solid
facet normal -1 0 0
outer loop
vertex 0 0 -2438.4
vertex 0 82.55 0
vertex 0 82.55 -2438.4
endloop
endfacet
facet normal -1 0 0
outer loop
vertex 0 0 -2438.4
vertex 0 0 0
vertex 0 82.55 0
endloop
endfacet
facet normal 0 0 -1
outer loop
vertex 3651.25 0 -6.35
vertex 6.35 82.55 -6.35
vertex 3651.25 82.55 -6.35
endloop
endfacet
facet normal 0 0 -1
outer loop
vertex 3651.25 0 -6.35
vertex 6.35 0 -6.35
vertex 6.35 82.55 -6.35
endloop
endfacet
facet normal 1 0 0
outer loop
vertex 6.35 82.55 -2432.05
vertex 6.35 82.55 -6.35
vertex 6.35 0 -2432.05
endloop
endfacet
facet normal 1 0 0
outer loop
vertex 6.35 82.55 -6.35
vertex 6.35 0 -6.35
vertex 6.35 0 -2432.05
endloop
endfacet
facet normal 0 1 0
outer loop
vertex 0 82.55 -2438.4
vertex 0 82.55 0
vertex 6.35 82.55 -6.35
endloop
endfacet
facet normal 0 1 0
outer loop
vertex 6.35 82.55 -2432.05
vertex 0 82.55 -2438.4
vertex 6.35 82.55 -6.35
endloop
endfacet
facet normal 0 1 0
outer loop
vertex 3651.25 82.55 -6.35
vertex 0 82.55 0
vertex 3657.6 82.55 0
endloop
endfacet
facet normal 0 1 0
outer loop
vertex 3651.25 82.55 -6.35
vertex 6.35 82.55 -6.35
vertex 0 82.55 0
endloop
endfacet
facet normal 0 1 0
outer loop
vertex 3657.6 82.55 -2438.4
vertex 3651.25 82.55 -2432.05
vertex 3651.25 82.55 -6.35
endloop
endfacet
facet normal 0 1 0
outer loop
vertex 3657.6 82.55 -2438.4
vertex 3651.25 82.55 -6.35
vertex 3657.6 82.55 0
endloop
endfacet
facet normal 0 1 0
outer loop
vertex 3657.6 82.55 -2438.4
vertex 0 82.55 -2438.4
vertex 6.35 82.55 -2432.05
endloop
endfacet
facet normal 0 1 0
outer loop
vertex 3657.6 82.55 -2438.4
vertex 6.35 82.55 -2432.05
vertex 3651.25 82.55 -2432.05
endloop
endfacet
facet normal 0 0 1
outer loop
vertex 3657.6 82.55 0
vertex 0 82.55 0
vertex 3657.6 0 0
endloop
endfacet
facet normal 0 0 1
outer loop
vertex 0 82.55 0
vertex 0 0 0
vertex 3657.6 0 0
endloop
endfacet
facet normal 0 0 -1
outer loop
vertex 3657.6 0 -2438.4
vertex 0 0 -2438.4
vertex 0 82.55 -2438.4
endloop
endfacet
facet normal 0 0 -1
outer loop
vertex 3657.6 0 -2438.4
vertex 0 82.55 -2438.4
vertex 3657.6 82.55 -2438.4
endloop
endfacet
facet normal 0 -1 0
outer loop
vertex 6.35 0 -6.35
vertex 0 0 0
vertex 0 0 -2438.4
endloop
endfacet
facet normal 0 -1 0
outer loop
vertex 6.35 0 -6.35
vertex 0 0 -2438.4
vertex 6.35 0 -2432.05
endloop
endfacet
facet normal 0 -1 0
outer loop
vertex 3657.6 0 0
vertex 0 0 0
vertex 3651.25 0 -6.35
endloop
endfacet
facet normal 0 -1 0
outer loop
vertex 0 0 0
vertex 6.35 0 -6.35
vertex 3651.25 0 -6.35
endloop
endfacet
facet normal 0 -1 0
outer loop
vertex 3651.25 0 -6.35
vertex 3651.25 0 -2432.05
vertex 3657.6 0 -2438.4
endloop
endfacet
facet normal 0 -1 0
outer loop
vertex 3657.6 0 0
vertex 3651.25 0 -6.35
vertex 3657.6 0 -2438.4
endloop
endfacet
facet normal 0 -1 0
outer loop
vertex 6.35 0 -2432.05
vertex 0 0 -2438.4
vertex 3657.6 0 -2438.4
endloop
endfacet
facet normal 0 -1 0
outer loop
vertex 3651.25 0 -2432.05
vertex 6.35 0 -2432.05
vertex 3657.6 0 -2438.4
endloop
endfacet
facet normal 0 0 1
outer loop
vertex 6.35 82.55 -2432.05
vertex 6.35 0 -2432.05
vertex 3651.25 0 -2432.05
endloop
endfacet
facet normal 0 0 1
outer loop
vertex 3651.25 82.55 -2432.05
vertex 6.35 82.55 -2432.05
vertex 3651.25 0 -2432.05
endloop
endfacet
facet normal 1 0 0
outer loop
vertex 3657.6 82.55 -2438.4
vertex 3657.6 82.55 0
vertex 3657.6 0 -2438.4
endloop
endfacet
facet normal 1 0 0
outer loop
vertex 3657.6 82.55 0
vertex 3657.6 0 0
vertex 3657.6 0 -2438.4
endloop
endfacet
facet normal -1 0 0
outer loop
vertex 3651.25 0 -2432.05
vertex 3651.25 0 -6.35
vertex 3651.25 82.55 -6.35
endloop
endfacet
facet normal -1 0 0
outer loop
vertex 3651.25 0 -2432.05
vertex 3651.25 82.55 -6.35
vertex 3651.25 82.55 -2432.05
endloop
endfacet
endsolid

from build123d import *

# Parameters (mm, degrees)
SKETCH1_W           = 3657.6
SKETCH1_H           = 2438.4
BOSS_EXTRUDE1_DEPTH = 6.35
SKETCH3_W           = 3657.6
SKETCH3_H           = 2438.4
SKETCH3_W_2         = 3644.9
SKETCH3_H_2         = 2425.7
BOSS_EXTRUDE2_DEPTH = 76.2
SKETCH4_W           = 3644.9
SKETCH4_H           = 2425.7
CUT_EXTRUDE1_DEPTH  = 7.35


with BuildPart() as part:
    # Sketch1 → Boss-Extrude1 (new body)
    with BuildSketch(Plane(origin=(0, 0, 0), x_dir=(1, 0, 0), z_dir=(0, 1, 0))):
        with Locations((1828.8, 1219.2)):
            Rectangle(SKETCH1_W, SKETCH1_H)
    extrude(amount=BOSS_EXTRUDE1_DEPTH)

    # Sketch3 → Boss-Extrude2 (add)
    with BuildSketch(Plane(origin=(0, 6.35, 0), x_dir=(1, 0, 0), z_dir=(0, 1, 0))):
        with Locations((1828.8, 1219.2)):
            Rectangle(SKETCH3_W, SKETCH3_H)
        with Locations((1828.8, 1219.2)):
            Rectangle(SKETCH3_W_2, SKETCH3_H_2, mode=Mode.SUBTRACT)
    extrude(amount=BOSS_EXTRUDE2_DEPTH)

    # Sketch4 → Cut-Extrude1 (cut, through all)
    with BuildSketch(Plane(origin=(0, 6.35, 0), x_dir=(1, 0, 0), z_dir=(0, 1, 0))):
        with Locations((1828.8, 1219.2)):
            Rectangle(SKETCH4_W, SKETCH4_H)
    extrude(amount=-CUT_EXTRUDE1_DEPTH, mode=Mode.SUBTRACT)


solid = part.part
